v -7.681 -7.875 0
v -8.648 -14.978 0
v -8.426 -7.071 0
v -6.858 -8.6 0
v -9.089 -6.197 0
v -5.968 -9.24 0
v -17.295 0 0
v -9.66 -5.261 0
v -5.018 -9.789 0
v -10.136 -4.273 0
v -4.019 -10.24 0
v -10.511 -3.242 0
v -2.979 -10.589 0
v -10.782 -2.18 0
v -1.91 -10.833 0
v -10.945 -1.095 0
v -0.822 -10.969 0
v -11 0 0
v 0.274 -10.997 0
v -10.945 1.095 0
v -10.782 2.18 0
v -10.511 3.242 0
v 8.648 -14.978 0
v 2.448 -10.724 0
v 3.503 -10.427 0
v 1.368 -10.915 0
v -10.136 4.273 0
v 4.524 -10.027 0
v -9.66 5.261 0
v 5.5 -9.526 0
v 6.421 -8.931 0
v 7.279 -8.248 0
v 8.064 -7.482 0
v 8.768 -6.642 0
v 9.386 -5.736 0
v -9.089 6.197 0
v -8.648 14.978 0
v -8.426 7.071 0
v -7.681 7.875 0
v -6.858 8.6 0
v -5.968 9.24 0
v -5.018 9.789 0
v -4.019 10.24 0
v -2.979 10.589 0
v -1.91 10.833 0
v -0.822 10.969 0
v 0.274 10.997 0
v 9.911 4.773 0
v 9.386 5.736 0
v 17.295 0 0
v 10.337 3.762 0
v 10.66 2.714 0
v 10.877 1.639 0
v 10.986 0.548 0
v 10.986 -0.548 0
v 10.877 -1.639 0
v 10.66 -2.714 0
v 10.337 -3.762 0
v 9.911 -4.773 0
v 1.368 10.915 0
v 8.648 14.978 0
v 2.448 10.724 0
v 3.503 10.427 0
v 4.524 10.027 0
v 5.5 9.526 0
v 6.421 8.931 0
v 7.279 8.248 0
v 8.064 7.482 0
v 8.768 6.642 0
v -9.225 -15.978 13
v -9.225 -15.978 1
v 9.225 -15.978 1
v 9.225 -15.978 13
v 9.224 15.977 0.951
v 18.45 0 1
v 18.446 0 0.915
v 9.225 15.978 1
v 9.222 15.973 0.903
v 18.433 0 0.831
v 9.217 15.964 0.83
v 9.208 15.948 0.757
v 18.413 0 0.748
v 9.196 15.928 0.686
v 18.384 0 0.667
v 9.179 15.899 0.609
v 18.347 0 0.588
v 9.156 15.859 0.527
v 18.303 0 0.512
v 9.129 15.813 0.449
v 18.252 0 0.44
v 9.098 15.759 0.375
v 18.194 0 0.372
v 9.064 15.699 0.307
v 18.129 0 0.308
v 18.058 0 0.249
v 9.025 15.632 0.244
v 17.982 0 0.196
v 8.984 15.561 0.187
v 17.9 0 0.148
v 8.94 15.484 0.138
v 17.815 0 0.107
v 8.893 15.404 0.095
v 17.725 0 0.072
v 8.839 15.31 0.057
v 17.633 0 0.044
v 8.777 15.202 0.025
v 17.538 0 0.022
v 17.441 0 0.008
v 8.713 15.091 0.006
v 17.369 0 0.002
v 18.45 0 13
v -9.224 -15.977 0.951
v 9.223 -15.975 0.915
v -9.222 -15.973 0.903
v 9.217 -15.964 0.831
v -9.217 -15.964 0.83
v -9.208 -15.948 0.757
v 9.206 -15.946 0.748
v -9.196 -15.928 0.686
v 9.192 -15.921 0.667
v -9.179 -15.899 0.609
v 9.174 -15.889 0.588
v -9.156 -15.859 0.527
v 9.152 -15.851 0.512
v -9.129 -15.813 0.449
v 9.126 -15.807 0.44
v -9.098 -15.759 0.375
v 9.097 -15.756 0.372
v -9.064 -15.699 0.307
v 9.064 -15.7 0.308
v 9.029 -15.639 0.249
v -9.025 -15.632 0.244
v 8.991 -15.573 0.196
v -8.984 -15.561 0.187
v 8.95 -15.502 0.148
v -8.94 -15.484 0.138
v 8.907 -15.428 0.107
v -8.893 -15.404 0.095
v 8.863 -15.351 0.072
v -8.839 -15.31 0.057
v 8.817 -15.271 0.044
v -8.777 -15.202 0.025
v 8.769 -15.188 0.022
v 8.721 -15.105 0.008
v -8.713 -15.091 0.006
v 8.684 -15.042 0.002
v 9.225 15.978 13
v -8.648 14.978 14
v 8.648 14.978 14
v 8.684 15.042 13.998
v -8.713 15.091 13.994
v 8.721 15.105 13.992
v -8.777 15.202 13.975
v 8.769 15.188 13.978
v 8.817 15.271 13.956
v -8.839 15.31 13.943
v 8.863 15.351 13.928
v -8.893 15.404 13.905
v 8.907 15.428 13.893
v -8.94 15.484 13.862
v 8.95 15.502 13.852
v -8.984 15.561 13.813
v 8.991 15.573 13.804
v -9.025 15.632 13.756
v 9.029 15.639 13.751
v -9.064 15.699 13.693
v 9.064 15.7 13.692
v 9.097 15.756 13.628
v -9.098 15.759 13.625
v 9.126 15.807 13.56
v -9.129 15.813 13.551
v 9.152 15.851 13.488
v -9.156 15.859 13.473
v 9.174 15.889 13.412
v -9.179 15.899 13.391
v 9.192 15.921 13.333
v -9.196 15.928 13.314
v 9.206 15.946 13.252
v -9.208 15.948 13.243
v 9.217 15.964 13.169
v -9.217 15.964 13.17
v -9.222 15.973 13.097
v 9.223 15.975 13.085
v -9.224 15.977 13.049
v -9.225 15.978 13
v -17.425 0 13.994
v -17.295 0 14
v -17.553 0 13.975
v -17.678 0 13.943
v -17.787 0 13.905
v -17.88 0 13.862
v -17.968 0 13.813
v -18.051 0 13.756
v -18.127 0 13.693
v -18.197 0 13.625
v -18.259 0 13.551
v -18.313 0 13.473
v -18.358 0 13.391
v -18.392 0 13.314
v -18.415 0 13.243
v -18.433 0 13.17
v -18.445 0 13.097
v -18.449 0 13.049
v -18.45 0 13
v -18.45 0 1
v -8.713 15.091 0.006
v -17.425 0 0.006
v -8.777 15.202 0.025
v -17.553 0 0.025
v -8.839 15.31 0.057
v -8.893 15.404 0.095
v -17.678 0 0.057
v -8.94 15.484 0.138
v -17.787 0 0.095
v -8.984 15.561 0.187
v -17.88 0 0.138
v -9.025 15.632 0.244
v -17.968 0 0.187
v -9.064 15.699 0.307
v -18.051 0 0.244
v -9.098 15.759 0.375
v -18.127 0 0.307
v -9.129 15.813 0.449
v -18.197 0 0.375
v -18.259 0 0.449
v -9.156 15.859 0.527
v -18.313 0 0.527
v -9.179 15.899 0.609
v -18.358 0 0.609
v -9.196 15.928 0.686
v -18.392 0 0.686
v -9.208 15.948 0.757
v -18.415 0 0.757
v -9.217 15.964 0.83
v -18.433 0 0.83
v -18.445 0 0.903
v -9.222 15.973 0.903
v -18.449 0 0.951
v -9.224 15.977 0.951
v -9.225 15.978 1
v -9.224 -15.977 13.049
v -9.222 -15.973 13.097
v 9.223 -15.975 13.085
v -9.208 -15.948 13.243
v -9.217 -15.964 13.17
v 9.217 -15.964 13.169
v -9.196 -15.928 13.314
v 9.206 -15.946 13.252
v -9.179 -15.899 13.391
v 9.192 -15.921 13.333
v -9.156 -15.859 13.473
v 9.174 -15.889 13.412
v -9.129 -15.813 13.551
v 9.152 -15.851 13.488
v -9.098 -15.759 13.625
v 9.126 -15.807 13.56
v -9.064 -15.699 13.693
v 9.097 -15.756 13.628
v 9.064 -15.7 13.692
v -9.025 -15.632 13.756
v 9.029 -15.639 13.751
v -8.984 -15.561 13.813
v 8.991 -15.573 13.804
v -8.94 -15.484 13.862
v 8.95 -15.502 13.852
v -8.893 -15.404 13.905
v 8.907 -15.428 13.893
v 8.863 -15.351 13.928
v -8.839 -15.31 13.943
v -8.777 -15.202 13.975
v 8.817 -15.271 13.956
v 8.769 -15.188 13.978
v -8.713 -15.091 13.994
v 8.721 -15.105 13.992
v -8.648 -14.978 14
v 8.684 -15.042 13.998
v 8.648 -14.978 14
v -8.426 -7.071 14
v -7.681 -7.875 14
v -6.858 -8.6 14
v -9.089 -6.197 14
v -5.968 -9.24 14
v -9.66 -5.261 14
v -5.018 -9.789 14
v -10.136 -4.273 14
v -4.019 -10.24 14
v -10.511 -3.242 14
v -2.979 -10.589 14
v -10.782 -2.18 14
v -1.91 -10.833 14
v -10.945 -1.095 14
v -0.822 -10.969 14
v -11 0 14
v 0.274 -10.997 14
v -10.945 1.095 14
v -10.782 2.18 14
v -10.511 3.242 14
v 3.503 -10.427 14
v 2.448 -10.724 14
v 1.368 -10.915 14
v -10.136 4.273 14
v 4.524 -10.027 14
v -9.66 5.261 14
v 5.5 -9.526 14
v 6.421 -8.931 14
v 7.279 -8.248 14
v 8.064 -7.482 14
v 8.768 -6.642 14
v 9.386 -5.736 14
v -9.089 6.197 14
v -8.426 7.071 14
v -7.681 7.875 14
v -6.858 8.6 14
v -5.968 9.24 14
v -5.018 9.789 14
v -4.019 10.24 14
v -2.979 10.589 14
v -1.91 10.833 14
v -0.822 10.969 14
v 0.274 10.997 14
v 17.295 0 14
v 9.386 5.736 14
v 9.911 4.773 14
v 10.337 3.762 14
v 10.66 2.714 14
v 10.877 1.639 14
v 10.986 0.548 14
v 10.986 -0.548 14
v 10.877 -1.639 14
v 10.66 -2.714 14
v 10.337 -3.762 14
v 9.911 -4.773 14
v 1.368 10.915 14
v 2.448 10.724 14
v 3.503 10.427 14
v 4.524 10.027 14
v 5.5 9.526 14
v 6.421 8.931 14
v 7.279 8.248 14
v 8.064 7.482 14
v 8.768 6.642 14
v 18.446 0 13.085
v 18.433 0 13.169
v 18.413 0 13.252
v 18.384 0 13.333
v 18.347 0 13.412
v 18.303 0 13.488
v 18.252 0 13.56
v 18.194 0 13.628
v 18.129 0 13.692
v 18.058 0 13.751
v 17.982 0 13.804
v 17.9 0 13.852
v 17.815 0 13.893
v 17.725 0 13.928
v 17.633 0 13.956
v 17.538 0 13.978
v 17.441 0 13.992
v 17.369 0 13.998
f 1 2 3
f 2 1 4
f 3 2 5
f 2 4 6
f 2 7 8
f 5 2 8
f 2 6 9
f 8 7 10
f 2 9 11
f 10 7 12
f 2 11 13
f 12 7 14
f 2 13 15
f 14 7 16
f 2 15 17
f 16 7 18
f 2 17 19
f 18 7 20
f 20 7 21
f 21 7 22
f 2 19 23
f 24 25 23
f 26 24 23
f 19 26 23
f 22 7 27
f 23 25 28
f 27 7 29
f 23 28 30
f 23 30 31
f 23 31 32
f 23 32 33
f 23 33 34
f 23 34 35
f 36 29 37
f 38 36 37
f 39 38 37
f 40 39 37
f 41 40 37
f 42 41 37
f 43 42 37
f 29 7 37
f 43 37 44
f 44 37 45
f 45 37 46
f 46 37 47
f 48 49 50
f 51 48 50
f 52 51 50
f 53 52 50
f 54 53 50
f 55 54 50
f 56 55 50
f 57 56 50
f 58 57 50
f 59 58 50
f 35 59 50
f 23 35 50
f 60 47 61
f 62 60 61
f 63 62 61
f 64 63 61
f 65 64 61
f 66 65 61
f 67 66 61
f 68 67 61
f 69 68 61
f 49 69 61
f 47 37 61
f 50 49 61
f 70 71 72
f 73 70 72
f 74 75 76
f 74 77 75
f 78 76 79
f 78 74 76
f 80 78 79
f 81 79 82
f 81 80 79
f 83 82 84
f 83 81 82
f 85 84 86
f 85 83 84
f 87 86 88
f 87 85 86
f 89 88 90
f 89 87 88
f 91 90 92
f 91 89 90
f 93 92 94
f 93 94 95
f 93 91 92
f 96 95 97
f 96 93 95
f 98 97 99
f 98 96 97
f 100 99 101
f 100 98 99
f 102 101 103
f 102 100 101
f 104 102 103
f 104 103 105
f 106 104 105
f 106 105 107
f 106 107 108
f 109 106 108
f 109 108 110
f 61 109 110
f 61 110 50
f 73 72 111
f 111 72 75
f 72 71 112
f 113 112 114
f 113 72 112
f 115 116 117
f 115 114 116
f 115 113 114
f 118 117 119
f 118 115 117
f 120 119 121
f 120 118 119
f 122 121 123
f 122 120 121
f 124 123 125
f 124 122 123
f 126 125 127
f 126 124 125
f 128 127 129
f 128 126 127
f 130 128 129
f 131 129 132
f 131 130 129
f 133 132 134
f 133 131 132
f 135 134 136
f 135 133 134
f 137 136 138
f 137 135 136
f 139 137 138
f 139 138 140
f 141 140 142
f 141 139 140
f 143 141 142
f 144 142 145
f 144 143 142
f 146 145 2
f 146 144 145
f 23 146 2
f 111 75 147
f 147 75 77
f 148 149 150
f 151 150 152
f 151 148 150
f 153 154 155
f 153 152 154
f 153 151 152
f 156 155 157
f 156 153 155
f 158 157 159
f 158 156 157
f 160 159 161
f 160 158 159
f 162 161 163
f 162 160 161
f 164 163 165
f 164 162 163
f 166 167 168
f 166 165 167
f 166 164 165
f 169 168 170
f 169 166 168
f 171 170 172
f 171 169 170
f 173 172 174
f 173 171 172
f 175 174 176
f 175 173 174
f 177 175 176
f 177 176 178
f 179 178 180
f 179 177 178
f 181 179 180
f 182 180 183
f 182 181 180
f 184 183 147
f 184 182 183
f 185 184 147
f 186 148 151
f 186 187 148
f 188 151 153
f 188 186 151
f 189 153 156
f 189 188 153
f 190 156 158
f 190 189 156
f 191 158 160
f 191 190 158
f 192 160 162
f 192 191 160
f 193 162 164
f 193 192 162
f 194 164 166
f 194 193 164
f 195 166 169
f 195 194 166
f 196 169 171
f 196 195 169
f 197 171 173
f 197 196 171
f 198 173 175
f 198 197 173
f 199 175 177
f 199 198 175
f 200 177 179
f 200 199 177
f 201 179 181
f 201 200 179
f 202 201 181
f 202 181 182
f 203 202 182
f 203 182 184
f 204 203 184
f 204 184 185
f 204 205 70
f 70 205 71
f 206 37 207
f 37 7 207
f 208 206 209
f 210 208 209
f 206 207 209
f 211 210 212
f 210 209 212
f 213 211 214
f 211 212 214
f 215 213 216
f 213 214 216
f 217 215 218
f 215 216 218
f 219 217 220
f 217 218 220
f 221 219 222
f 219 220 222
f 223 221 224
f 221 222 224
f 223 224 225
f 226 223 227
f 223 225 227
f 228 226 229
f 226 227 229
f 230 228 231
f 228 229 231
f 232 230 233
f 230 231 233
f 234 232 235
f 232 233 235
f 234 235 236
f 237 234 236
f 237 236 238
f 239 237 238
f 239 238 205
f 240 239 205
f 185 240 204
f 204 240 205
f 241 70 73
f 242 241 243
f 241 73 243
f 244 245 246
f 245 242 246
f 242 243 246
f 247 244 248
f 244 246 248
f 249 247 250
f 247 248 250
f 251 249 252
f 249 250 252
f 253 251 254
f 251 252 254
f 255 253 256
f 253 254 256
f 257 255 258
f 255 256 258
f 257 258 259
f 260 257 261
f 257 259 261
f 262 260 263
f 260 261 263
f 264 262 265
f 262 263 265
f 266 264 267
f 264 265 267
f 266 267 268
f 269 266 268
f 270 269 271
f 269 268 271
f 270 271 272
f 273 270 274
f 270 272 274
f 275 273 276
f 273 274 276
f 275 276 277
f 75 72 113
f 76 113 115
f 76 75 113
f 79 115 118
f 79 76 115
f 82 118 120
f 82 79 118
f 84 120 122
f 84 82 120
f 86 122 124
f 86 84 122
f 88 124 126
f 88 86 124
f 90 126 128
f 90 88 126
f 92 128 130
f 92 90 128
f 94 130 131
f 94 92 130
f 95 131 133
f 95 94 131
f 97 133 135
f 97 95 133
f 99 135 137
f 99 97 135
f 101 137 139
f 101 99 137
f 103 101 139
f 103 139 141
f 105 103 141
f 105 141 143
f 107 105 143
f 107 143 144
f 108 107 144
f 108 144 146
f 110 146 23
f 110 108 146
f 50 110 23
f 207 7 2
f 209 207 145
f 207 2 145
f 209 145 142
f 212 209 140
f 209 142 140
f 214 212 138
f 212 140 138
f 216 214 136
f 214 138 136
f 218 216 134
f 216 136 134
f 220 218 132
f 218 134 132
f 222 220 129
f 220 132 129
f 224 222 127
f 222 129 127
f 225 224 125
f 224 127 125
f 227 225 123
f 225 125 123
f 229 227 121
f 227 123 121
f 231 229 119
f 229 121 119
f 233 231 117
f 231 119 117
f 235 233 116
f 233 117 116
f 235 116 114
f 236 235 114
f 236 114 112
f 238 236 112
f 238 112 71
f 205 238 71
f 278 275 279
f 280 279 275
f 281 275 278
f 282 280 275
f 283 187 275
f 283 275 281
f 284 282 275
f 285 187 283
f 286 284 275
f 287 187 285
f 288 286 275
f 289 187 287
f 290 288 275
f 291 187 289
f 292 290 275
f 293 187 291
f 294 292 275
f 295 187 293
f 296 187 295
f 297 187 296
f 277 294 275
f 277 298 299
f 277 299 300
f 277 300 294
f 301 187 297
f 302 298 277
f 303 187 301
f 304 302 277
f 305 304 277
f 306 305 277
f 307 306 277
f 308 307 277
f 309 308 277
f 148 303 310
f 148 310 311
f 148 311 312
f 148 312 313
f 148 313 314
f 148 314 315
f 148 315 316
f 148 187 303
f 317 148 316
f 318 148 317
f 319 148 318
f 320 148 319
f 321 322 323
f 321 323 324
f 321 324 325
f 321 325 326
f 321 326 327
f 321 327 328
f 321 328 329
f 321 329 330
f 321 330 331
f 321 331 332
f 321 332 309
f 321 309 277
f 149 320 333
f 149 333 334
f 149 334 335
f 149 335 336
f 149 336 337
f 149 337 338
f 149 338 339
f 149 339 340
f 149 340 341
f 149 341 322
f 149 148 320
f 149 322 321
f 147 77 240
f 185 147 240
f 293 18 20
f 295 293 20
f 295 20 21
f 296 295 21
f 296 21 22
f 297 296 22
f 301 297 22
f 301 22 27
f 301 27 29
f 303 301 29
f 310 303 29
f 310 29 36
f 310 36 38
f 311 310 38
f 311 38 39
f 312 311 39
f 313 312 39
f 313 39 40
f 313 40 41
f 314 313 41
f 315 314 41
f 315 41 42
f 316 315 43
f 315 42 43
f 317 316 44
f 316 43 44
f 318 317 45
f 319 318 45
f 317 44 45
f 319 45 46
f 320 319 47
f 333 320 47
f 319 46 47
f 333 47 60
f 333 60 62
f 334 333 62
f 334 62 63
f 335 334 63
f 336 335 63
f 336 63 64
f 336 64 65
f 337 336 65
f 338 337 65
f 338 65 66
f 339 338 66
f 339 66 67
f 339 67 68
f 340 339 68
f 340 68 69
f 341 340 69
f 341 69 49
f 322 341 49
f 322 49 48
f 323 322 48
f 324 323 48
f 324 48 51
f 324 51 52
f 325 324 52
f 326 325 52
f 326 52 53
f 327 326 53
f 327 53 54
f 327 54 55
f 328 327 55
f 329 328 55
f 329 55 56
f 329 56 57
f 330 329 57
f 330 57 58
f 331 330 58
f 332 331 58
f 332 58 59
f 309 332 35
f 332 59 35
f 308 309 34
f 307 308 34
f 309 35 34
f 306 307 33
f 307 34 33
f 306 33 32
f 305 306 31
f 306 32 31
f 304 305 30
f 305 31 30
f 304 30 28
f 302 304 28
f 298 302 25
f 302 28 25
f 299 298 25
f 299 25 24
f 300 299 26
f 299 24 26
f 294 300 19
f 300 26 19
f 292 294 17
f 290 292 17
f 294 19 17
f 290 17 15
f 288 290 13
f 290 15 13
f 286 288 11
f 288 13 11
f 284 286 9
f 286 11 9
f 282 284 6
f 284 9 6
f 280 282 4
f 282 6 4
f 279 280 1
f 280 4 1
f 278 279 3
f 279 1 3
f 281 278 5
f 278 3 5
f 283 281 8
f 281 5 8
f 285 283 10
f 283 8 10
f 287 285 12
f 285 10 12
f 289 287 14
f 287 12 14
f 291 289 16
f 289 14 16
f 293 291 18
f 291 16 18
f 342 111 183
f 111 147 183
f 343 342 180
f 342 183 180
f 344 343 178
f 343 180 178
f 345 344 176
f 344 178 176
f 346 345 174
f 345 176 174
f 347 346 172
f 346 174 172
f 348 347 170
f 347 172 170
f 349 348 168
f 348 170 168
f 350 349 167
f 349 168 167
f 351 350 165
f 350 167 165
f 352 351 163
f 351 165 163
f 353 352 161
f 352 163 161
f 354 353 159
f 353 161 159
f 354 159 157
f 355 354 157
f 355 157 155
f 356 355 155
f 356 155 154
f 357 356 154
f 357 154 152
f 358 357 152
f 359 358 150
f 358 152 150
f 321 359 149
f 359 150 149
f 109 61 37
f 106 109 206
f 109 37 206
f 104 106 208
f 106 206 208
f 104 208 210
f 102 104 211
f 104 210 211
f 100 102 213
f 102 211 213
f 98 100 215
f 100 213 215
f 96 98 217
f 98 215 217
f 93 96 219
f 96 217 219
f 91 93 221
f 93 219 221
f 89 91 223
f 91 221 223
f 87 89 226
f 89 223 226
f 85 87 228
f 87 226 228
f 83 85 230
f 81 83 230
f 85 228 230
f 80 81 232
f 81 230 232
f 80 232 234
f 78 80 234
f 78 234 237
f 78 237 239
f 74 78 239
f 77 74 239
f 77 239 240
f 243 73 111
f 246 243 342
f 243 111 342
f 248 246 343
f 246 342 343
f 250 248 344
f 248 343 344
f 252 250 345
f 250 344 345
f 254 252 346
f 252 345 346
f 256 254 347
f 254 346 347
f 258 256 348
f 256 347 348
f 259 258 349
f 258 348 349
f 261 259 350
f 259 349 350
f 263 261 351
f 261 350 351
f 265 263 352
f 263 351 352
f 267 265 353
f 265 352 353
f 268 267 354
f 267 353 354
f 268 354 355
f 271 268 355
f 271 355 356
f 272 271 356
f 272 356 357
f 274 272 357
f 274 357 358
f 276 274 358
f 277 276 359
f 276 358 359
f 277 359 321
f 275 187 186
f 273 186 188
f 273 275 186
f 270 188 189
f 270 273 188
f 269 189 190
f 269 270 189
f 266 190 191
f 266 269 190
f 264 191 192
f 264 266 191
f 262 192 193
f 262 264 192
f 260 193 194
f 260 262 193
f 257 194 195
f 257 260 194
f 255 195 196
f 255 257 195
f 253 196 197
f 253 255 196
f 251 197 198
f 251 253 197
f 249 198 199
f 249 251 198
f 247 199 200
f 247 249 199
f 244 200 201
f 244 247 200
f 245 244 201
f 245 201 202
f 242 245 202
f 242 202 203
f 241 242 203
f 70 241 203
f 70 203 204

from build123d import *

# Parameters (mm, degrees)
EXTRUDE_1_DEPTH     = 14
SKETCH_3_R          = 11
CUT_EXTRUDE_2_DEPTH = 29.13724178
FILLET_1_R          = 1


with BuildPart() as part:
    # 草图2 → 拉伸1 (new body)
    with BuildSketch(Plane.XY):
        Polygon((9.225, -15.9781687), (18.45, 0), (9.225, 15.9781687), (-9.225, 15.9781687), (-18.45, 0), (-9.225, -15.9781687), align=None)
    extrude(amount=EXTRUDE_1_DEPTH)

    # 草图3 → 拉伸2 (cut, through all)
    with BuildSketch(Plane(origin=(0, 0, 0), x_dir=(-1, 0, 0), z_dir=(0, 0, -1))):
        Circle(SKETCH_3_R)
    extrude(amount=-CUT_EXTRUDE_2_DEPTH, mode=Mode.SUBTRACT)

    # 圆角1
    fillet_1_edges = [part.edges().sort_by_distance(p)[0] for p in [
        (13.8375, 7.98908435, 14),
        (0, 15.9781687, 14),
        (-13.8375, 7.98908435, 14),
        (-13.8375, -7.98908435, 14),
        (0, -15.9781687, 14),
        (-13.8375, -7.98908435, 0),
        (-13.8375, 7.98908435, 0),
        (0, 15.9781687, 0),
        (13.8375, -7.98908435, 14),
        (13.8375, 7.98908435, 0),
        (13.8375, -7.98908435, 0),
        (0, -15.9781687, 0),
    ]]
    fillet(fillet_1_edges, radius=FILLET_1_R)


solid = part.part
